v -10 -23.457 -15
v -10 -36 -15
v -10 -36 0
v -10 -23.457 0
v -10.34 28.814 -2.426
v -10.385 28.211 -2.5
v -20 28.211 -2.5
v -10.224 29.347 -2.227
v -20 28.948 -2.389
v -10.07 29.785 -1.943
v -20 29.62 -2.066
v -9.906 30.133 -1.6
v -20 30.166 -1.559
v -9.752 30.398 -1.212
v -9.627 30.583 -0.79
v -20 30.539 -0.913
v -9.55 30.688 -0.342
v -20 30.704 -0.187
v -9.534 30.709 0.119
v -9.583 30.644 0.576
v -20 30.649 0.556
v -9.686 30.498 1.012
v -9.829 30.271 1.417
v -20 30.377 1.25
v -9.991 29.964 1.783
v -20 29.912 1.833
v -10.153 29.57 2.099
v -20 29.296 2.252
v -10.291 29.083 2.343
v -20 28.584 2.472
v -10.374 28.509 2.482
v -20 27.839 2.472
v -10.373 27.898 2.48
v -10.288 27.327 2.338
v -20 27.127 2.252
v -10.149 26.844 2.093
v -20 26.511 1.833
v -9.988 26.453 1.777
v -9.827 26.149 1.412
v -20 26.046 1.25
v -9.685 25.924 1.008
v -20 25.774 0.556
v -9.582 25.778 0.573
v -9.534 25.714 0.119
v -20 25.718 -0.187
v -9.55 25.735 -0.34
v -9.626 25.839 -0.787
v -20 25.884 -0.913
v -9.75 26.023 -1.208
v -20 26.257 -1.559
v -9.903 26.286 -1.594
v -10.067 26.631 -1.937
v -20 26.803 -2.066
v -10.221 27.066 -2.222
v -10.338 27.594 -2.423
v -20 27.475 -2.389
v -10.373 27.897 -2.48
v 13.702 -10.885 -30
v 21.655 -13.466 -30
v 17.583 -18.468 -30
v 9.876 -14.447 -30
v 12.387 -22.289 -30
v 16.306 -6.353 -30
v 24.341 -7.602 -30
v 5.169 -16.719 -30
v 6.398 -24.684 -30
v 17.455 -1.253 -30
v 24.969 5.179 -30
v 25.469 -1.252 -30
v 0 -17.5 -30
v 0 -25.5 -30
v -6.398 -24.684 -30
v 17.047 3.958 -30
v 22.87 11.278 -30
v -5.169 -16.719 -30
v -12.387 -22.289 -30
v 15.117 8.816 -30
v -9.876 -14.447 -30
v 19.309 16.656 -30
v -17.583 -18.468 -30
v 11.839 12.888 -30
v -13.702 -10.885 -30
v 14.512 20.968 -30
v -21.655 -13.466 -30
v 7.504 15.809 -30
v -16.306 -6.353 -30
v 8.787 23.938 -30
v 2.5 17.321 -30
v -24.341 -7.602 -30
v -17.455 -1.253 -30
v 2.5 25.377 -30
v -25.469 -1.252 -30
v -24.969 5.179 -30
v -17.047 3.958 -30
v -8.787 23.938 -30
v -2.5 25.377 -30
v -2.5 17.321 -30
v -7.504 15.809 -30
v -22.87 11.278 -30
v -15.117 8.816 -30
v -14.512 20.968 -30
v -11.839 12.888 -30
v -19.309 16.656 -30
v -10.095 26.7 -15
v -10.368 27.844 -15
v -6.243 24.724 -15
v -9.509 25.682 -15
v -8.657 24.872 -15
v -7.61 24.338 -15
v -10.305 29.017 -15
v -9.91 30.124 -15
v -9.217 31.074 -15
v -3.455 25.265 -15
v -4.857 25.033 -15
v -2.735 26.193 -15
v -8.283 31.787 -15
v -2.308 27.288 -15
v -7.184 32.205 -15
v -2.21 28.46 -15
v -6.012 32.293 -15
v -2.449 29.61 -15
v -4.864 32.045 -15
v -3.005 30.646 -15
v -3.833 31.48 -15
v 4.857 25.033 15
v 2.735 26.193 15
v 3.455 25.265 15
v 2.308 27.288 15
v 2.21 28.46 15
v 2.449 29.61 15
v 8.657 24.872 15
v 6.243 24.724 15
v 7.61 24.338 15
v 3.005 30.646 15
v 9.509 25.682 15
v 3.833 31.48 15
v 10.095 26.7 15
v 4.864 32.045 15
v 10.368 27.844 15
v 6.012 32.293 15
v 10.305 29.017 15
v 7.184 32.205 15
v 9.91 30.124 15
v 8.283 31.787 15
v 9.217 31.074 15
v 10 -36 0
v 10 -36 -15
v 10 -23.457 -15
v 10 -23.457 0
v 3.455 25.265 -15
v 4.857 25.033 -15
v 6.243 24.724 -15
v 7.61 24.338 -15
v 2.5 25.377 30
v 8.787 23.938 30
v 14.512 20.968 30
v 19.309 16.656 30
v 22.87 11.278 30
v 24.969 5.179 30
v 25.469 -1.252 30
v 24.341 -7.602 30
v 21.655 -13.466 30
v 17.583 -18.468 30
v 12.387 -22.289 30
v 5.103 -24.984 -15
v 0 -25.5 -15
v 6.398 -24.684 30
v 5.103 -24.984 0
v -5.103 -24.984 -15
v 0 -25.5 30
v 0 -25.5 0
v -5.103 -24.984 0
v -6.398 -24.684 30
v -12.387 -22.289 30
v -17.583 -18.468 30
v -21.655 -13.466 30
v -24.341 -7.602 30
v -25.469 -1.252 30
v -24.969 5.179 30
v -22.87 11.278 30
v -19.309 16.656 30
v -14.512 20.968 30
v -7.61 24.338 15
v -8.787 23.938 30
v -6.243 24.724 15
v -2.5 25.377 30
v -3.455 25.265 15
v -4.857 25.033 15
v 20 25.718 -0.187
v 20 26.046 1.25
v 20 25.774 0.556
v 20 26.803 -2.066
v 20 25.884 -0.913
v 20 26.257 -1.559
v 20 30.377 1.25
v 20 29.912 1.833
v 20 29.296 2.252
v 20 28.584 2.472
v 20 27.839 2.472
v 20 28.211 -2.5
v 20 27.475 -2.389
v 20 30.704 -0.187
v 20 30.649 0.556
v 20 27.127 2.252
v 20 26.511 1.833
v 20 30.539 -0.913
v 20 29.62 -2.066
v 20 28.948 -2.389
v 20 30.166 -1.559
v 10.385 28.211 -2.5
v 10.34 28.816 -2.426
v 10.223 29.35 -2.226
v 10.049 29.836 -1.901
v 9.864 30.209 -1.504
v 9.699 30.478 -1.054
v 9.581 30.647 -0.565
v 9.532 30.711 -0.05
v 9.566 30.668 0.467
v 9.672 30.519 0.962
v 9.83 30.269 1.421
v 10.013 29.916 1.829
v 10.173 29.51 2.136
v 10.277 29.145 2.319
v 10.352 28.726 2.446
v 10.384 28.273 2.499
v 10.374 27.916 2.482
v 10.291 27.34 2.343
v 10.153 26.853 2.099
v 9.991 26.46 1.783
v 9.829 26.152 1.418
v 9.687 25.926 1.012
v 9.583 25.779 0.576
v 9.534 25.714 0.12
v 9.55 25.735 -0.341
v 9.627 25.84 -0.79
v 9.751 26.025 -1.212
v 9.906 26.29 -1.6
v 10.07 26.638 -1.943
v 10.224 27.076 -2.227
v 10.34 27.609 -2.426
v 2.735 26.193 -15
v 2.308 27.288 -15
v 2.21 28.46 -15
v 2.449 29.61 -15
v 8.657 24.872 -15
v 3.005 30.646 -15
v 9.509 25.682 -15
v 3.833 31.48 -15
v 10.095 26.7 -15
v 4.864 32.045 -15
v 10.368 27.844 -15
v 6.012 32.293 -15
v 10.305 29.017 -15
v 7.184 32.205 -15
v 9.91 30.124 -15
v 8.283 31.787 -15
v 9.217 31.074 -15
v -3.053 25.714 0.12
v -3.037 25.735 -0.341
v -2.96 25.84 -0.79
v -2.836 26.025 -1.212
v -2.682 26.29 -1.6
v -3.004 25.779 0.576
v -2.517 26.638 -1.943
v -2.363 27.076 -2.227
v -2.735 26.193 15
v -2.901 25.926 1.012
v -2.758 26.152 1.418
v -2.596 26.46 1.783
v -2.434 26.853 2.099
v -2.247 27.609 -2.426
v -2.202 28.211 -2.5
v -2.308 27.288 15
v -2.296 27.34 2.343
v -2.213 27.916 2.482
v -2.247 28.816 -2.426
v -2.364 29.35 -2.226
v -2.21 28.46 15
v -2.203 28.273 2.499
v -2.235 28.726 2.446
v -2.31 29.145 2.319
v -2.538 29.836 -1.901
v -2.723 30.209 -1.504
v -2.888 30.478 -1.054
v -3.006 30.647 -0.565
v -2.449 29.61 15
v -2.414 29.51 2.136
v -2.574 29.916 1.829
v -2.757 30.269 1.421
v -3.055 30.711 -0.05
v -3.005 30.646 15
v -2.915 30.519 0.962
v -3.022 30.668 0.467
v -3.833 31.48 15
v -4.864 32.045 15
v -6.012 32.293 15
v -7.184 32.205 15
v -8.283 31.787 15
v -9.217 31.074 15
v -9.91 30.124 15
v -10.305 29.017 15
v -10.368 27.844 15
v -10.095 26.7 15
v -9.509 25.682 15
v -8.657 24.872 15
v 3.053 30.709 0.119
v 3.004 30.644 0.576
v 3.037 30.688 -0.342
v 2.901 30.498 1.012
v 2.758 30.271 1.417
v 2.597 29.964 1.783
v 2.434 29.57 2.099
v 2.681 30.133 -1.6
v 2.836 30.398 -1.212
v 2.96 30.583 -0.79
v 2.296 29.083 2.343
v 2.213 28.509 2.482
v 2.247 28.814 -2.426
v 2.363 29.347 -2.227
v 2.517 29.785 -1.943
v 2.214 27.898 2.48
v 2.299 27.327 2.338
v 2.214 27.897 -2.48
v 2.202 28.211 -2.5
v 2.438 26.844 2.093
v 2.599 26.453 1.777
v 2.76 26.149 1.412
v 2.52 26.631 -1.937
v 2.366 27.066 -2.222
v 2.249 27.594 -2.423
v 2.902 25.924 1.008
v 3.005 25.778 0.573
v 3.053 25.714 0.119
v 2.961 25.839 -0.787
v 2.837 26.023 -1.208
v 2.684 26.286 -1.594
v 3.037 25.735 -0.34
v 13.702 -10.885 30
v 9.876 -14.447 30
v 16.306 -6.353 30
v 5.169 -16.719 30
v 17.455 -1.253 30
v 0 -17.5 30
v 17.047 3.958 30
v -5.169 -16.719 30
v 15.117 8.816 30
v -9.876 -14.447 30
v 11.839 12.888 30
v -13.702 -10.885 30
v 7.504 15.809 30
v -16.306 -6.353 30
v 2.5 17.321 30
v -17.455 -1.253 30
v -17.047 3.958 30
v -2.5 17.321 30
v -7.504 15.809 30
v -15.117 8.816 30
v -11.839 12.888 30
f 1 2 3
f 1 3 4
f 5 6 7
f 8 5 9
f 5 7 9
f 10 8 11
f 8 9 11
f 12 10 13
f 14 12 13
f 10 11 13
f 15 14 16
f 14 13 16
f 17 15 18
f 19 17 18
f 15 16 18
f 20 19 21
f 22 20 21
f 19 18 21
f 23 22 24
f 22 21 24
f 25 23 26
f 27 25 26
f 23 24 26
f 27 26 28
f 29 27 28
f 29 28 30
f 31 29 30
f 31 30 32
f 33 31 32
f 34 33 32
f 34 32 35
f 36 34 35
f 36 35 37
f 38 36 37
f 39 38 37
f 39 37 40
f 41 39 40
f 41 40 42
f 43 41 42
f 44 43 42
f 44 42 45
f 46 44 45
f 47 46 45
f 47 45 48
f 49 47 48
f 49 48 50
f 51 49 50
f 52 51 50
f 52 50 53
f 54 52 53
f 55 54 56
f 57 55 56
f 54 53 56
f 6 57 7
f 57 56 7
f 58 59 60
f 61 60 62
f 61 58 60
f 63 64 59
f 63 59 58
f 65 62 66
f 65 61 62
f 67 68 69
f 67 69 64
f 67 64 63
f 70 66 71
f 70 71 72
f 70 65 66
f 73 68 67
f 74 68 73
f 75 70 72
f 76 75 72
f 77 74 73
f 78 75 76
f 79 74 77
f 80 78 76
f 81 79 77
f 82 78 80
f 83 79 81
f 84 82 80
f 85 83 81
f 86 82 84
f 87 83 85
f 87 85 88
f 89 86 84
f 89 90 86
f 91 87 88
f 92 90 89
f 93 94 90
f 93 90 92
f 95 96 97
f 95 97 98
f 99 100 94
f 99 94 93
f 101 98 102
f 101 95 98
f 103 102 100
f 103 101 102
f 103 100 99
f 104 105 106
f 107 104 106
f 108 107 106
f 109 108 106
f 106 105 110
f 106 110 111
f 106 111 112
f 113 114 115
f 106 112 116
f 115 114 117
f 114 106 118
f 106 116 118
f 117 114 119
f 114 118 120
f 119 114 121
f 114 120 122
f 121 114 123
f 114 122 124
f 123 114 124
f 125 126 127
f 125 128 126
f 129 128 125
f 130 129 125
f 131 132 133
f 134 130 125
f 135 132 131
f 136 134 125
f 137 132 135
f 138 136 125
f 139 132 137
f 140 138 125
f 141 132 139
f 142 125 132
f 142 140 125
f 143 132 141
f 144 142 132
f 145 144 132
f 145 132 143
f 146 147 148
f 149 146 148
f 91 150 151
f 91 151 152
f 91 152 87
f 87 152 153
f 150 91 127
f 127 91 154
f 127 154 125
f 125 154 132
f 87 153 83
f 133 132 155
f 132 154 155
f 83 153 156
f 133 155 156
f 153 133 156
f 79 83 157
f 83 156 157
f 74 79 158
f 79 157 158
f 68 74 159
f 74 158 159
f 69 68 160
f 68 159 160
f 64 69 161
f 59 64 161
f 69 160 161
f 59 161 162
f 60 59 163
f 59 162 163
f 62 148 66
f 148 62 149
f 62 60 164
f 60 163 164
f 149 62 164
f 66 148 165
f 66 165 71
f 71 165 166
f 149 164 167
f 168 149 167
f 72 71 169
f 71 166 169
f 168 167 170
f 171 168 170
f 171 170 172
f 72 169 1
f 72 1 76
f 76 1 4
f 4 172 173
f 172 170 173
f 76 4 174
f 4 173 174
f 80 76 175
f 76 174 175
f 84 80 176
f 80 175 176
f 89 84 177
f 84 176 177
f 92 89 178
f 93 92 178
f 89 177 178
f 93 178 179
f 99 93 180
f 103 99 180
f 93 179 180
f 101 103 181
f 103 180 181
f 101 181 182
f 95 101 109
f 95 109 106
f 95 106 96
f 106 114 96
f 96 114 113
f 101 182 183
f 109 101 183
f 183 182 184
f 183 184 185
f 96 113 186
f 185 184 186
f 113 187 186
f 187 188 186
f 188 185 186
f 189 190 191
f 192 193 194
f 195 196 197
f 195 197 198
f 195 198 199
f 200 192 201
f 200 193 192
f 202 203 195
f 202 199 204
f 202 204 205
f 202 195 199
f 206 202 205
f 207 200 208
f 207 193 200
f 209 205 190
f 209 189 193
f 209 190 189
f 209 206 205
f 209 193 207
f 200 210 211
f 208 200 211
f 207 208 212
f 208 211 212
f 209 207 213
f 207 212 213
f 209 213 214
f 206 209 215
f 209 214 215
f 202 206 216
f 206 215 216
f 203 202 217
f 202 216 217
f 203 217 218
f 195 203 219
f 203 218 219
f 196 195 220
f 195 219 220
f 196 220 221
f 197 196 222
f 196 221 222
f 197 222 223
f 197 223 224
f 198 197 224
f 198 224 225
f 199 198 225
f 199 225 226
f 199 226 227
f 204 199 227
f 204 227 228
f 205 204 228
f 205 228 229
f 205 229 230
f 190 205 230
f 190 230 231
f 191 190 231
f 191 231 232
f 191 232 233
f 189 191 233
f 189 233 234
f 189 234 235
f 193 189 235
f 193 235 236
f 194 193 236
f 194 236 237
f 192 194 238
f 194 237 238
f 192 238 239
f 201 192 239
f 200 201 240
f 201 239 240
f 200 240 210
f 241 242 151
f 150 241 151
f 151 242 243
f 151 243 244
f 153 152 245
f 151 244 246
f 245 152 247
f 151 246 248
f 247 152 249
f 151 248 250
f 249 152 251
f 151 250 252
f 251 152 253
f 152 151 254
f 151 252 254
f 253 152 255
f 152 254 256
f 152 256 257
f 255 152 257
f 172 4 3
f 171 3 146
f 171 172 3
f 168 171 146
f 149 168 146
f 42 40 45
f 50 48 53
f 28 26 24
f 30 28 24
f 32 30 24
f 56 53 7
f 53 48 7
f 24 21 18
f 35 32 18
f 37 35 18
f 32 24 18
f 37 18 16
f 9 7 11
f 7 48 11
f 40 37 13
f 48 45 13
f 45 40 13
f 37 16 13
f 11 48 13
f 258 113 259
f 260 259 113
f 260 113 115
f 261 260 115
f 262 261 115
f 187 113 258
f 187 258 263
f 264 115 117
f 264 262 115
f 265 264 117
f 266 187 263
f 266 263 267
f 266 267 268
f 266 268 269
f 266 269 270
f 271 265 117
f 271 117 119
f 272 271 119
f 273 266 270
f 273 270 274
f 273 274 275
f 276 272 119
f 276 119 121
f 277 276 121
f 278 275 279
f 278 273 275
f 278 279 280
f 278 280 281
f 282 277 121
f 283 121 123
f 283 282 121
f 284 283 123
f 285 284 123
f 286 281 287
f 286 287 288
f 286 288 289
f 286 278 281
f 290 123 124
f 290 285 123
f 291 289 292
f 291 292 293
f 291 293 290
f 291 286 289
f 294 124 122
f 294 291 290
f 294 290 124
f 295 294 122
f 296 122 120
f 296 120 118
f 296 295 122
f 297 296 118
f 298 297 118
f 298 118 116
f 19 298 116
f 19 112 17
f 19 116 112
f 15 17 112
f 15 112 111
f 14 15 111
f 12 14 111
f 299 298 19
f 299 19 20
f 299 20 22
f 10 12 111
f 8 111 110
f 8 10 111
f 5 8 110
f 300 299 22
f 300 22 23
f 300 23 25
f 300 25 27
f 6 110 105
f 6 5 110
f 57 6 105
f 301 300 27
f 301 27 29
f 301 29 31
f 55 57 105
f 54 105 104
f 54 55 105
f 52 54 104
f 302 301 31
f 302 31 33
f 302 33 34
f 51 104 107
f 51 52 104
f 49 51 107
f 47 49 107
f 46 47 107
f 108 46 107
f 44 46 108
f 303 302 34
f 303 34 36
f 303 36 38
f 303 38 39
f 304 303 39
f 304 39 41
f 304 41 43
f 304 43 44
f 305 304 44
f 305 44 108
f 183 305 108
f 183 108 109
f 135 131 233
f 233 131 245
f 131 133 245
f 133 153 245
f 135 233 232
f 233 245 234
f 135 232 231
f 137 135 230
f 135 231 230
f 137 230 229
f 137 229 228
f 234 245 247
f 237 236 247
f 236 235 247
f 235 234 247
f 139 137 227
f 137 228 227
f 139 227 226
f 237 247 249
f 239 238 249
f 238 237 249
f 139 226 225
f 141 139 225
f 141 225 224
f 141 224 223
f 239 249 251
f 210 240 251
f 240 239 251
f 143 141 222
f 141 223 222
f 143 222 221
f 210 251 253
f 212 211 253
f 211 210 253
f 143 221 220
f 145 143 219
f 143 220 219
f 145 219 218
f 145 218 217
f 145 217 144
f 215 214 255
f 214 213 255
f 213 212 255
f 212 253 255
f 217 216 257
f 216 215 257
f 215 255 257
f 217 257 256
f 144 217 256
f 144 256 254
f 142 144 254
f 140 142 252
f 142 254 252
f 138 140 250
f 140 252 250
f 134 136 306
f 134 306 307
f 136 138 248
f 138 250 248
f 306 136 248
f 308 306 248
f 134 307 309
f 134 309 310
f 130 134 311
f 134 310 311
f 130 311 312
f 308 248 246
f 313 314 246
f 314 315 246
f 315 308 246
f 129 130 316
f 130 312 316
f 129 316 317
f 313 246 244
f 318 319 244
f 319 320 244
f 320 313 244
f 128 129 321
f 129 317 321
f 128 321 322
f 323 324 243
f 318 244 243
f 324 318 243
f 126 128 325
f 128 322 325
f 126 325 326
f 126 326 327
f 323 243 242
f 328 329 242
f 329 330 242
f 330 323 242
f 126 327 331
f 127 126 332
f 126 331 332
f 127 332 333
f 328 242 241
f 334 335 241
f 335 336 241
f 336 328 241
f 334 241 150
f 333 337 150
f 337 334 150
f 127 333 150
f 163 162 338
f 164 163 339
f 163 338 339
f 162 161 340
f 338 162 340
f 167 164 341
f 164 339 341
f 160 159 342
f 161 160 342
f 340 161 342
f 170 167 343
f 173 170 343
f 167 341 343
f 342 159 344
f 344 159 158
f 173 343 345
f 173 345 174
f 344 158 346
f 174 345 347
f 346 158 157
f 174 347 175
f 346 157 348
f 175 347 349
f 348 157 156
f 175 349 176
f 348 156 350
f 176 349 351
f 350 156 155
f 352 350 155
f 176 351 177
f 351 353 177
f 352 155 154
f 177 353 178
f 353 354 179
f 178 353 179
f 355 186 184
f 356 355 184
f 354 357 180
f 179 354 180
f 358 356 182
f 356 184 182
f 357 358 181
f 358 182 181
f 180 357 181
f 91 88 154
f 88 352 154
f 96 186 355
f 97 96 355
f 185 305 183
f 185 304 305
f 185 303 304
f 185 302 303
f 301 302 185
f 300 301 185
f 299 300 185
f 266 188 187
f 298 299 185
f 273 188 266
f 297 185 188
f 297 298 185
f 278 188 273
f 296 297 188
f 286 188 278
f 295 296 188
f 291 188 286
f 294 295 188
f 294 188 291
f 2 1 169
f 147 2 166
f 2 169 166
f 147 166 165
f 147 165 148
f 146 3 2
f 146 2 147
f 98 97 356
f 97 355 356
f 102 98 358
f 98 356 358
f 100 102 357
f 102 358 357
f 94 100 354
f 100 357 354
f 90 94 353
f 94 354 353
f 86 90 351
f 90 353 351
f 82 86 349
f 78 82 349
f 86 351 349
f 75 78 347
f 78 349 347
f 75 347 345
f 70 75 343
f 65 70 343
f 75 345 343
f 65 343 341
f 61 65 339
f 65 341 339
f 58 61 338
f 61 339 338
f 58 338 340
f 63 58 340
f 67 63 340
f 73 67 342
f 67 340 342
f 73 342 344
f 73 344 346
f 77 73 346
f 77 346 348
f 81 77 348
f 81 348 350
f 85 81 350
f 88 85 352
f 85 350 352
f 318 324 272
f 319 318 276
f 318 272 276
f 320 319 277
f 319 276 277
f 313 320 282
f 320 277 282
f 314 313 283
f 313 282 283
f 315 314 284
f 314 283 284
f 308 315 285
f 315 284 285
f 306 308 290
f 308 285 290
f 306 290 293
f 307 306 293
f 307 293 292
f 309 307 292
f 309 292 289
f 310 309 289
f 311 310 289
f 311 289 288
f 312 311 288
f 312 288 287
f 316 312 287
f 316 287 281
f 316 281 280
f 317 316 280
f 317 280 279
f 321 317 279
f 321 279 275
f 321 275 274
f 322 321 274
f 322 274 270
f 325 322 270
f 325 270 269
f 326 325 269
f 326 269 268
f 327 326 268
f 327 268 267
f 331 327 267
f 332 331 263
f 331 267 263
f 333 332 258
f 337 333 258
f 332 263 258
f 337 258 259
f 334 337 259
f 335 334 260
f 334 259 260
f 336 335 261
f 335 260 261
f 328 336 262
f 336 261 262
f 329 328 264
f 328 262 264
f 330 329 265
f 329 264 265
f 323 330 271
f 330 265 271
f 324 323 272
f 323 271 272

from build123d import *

# Parameters (mm, degrees)
BOSS_EXTRUDE1_DEPTH      = 30
SKETCH2_R                = 4.091242679
BOSS_EXTRUDE2_DEPTH      = 15
SKETCH3_W                = 20
SKETCH3_H                = 12.982921918
BOSS_EXTRUDE3_DEPTH      = 15
BOSS_EXTRUDE5_DEPTH      = 20
BOSS_EXTRUDE5_DEPTH_BACK = 20
SKETCH5_R                = 2.5


with BuildPart() as part:
    # Sketch1 → Boss-Extrude1 (new, symmetric)
    with BuildSketch(Plane.XY):
        with BuildLine():
            Line((-2.5, 25.377155081), (-2.5, 17.320508076))
            ThreePointArc((-2.5, 17.320508076), (0, -17.5), (2.5, 17.320508076))
            Line((2.5, 17.320508076), (2.5, 25.377155081))
            ThreePointArc((2.5, 25.377155081), (0, -25.5), (-2.5, 25.377155081))
        make_face()
    extrude(amount=BOSS_EXTRUDE1_DEPTH, both=True)

    # Sketch2 → Boss-Extrude2 (add, symmetric)
    with BuildSketch(Plane.XY):
        with Locations((6.293533022, 28.211487403)):
            Circle(SKETCH2_R)
        with Locations((-6.293533022, 28.211487403)):
            Circle(SKETCH2_R)
    extrude(amount=BOSS_EXTRUDE2_DEPTH, both=True)

    # Sketch3 → Boss-Extrude3 (add)
    with BuildSketch(Plane.XY):
        with Locations((0, -29.508539041)):
            Rectangle(SKETCH3_W, SKETCH3_H)
    extrude(amount=-BOSS_EXTRUDE3_DEPTH)

    # Sketch5 → Boss-Extrude5 (add, two sides: drawn at the far end of the back side and taken through both)
    with BuildSketch(Plane(origin=(0, 0, 0), x_dir=(0, 0, -1), z_dir=(1, 0, 0)).offset(-BOSS_EXTRUDE5_DEPTH_BACK)):
        with Locations((0, 28.211487403)):
            Circle(SKETCH5_R)
    extrude(amount=BOSS_EXTRUDE5_DEPTH + BOSS_EXTRUDE5_DEPTH_BACK)


solid = part.part
